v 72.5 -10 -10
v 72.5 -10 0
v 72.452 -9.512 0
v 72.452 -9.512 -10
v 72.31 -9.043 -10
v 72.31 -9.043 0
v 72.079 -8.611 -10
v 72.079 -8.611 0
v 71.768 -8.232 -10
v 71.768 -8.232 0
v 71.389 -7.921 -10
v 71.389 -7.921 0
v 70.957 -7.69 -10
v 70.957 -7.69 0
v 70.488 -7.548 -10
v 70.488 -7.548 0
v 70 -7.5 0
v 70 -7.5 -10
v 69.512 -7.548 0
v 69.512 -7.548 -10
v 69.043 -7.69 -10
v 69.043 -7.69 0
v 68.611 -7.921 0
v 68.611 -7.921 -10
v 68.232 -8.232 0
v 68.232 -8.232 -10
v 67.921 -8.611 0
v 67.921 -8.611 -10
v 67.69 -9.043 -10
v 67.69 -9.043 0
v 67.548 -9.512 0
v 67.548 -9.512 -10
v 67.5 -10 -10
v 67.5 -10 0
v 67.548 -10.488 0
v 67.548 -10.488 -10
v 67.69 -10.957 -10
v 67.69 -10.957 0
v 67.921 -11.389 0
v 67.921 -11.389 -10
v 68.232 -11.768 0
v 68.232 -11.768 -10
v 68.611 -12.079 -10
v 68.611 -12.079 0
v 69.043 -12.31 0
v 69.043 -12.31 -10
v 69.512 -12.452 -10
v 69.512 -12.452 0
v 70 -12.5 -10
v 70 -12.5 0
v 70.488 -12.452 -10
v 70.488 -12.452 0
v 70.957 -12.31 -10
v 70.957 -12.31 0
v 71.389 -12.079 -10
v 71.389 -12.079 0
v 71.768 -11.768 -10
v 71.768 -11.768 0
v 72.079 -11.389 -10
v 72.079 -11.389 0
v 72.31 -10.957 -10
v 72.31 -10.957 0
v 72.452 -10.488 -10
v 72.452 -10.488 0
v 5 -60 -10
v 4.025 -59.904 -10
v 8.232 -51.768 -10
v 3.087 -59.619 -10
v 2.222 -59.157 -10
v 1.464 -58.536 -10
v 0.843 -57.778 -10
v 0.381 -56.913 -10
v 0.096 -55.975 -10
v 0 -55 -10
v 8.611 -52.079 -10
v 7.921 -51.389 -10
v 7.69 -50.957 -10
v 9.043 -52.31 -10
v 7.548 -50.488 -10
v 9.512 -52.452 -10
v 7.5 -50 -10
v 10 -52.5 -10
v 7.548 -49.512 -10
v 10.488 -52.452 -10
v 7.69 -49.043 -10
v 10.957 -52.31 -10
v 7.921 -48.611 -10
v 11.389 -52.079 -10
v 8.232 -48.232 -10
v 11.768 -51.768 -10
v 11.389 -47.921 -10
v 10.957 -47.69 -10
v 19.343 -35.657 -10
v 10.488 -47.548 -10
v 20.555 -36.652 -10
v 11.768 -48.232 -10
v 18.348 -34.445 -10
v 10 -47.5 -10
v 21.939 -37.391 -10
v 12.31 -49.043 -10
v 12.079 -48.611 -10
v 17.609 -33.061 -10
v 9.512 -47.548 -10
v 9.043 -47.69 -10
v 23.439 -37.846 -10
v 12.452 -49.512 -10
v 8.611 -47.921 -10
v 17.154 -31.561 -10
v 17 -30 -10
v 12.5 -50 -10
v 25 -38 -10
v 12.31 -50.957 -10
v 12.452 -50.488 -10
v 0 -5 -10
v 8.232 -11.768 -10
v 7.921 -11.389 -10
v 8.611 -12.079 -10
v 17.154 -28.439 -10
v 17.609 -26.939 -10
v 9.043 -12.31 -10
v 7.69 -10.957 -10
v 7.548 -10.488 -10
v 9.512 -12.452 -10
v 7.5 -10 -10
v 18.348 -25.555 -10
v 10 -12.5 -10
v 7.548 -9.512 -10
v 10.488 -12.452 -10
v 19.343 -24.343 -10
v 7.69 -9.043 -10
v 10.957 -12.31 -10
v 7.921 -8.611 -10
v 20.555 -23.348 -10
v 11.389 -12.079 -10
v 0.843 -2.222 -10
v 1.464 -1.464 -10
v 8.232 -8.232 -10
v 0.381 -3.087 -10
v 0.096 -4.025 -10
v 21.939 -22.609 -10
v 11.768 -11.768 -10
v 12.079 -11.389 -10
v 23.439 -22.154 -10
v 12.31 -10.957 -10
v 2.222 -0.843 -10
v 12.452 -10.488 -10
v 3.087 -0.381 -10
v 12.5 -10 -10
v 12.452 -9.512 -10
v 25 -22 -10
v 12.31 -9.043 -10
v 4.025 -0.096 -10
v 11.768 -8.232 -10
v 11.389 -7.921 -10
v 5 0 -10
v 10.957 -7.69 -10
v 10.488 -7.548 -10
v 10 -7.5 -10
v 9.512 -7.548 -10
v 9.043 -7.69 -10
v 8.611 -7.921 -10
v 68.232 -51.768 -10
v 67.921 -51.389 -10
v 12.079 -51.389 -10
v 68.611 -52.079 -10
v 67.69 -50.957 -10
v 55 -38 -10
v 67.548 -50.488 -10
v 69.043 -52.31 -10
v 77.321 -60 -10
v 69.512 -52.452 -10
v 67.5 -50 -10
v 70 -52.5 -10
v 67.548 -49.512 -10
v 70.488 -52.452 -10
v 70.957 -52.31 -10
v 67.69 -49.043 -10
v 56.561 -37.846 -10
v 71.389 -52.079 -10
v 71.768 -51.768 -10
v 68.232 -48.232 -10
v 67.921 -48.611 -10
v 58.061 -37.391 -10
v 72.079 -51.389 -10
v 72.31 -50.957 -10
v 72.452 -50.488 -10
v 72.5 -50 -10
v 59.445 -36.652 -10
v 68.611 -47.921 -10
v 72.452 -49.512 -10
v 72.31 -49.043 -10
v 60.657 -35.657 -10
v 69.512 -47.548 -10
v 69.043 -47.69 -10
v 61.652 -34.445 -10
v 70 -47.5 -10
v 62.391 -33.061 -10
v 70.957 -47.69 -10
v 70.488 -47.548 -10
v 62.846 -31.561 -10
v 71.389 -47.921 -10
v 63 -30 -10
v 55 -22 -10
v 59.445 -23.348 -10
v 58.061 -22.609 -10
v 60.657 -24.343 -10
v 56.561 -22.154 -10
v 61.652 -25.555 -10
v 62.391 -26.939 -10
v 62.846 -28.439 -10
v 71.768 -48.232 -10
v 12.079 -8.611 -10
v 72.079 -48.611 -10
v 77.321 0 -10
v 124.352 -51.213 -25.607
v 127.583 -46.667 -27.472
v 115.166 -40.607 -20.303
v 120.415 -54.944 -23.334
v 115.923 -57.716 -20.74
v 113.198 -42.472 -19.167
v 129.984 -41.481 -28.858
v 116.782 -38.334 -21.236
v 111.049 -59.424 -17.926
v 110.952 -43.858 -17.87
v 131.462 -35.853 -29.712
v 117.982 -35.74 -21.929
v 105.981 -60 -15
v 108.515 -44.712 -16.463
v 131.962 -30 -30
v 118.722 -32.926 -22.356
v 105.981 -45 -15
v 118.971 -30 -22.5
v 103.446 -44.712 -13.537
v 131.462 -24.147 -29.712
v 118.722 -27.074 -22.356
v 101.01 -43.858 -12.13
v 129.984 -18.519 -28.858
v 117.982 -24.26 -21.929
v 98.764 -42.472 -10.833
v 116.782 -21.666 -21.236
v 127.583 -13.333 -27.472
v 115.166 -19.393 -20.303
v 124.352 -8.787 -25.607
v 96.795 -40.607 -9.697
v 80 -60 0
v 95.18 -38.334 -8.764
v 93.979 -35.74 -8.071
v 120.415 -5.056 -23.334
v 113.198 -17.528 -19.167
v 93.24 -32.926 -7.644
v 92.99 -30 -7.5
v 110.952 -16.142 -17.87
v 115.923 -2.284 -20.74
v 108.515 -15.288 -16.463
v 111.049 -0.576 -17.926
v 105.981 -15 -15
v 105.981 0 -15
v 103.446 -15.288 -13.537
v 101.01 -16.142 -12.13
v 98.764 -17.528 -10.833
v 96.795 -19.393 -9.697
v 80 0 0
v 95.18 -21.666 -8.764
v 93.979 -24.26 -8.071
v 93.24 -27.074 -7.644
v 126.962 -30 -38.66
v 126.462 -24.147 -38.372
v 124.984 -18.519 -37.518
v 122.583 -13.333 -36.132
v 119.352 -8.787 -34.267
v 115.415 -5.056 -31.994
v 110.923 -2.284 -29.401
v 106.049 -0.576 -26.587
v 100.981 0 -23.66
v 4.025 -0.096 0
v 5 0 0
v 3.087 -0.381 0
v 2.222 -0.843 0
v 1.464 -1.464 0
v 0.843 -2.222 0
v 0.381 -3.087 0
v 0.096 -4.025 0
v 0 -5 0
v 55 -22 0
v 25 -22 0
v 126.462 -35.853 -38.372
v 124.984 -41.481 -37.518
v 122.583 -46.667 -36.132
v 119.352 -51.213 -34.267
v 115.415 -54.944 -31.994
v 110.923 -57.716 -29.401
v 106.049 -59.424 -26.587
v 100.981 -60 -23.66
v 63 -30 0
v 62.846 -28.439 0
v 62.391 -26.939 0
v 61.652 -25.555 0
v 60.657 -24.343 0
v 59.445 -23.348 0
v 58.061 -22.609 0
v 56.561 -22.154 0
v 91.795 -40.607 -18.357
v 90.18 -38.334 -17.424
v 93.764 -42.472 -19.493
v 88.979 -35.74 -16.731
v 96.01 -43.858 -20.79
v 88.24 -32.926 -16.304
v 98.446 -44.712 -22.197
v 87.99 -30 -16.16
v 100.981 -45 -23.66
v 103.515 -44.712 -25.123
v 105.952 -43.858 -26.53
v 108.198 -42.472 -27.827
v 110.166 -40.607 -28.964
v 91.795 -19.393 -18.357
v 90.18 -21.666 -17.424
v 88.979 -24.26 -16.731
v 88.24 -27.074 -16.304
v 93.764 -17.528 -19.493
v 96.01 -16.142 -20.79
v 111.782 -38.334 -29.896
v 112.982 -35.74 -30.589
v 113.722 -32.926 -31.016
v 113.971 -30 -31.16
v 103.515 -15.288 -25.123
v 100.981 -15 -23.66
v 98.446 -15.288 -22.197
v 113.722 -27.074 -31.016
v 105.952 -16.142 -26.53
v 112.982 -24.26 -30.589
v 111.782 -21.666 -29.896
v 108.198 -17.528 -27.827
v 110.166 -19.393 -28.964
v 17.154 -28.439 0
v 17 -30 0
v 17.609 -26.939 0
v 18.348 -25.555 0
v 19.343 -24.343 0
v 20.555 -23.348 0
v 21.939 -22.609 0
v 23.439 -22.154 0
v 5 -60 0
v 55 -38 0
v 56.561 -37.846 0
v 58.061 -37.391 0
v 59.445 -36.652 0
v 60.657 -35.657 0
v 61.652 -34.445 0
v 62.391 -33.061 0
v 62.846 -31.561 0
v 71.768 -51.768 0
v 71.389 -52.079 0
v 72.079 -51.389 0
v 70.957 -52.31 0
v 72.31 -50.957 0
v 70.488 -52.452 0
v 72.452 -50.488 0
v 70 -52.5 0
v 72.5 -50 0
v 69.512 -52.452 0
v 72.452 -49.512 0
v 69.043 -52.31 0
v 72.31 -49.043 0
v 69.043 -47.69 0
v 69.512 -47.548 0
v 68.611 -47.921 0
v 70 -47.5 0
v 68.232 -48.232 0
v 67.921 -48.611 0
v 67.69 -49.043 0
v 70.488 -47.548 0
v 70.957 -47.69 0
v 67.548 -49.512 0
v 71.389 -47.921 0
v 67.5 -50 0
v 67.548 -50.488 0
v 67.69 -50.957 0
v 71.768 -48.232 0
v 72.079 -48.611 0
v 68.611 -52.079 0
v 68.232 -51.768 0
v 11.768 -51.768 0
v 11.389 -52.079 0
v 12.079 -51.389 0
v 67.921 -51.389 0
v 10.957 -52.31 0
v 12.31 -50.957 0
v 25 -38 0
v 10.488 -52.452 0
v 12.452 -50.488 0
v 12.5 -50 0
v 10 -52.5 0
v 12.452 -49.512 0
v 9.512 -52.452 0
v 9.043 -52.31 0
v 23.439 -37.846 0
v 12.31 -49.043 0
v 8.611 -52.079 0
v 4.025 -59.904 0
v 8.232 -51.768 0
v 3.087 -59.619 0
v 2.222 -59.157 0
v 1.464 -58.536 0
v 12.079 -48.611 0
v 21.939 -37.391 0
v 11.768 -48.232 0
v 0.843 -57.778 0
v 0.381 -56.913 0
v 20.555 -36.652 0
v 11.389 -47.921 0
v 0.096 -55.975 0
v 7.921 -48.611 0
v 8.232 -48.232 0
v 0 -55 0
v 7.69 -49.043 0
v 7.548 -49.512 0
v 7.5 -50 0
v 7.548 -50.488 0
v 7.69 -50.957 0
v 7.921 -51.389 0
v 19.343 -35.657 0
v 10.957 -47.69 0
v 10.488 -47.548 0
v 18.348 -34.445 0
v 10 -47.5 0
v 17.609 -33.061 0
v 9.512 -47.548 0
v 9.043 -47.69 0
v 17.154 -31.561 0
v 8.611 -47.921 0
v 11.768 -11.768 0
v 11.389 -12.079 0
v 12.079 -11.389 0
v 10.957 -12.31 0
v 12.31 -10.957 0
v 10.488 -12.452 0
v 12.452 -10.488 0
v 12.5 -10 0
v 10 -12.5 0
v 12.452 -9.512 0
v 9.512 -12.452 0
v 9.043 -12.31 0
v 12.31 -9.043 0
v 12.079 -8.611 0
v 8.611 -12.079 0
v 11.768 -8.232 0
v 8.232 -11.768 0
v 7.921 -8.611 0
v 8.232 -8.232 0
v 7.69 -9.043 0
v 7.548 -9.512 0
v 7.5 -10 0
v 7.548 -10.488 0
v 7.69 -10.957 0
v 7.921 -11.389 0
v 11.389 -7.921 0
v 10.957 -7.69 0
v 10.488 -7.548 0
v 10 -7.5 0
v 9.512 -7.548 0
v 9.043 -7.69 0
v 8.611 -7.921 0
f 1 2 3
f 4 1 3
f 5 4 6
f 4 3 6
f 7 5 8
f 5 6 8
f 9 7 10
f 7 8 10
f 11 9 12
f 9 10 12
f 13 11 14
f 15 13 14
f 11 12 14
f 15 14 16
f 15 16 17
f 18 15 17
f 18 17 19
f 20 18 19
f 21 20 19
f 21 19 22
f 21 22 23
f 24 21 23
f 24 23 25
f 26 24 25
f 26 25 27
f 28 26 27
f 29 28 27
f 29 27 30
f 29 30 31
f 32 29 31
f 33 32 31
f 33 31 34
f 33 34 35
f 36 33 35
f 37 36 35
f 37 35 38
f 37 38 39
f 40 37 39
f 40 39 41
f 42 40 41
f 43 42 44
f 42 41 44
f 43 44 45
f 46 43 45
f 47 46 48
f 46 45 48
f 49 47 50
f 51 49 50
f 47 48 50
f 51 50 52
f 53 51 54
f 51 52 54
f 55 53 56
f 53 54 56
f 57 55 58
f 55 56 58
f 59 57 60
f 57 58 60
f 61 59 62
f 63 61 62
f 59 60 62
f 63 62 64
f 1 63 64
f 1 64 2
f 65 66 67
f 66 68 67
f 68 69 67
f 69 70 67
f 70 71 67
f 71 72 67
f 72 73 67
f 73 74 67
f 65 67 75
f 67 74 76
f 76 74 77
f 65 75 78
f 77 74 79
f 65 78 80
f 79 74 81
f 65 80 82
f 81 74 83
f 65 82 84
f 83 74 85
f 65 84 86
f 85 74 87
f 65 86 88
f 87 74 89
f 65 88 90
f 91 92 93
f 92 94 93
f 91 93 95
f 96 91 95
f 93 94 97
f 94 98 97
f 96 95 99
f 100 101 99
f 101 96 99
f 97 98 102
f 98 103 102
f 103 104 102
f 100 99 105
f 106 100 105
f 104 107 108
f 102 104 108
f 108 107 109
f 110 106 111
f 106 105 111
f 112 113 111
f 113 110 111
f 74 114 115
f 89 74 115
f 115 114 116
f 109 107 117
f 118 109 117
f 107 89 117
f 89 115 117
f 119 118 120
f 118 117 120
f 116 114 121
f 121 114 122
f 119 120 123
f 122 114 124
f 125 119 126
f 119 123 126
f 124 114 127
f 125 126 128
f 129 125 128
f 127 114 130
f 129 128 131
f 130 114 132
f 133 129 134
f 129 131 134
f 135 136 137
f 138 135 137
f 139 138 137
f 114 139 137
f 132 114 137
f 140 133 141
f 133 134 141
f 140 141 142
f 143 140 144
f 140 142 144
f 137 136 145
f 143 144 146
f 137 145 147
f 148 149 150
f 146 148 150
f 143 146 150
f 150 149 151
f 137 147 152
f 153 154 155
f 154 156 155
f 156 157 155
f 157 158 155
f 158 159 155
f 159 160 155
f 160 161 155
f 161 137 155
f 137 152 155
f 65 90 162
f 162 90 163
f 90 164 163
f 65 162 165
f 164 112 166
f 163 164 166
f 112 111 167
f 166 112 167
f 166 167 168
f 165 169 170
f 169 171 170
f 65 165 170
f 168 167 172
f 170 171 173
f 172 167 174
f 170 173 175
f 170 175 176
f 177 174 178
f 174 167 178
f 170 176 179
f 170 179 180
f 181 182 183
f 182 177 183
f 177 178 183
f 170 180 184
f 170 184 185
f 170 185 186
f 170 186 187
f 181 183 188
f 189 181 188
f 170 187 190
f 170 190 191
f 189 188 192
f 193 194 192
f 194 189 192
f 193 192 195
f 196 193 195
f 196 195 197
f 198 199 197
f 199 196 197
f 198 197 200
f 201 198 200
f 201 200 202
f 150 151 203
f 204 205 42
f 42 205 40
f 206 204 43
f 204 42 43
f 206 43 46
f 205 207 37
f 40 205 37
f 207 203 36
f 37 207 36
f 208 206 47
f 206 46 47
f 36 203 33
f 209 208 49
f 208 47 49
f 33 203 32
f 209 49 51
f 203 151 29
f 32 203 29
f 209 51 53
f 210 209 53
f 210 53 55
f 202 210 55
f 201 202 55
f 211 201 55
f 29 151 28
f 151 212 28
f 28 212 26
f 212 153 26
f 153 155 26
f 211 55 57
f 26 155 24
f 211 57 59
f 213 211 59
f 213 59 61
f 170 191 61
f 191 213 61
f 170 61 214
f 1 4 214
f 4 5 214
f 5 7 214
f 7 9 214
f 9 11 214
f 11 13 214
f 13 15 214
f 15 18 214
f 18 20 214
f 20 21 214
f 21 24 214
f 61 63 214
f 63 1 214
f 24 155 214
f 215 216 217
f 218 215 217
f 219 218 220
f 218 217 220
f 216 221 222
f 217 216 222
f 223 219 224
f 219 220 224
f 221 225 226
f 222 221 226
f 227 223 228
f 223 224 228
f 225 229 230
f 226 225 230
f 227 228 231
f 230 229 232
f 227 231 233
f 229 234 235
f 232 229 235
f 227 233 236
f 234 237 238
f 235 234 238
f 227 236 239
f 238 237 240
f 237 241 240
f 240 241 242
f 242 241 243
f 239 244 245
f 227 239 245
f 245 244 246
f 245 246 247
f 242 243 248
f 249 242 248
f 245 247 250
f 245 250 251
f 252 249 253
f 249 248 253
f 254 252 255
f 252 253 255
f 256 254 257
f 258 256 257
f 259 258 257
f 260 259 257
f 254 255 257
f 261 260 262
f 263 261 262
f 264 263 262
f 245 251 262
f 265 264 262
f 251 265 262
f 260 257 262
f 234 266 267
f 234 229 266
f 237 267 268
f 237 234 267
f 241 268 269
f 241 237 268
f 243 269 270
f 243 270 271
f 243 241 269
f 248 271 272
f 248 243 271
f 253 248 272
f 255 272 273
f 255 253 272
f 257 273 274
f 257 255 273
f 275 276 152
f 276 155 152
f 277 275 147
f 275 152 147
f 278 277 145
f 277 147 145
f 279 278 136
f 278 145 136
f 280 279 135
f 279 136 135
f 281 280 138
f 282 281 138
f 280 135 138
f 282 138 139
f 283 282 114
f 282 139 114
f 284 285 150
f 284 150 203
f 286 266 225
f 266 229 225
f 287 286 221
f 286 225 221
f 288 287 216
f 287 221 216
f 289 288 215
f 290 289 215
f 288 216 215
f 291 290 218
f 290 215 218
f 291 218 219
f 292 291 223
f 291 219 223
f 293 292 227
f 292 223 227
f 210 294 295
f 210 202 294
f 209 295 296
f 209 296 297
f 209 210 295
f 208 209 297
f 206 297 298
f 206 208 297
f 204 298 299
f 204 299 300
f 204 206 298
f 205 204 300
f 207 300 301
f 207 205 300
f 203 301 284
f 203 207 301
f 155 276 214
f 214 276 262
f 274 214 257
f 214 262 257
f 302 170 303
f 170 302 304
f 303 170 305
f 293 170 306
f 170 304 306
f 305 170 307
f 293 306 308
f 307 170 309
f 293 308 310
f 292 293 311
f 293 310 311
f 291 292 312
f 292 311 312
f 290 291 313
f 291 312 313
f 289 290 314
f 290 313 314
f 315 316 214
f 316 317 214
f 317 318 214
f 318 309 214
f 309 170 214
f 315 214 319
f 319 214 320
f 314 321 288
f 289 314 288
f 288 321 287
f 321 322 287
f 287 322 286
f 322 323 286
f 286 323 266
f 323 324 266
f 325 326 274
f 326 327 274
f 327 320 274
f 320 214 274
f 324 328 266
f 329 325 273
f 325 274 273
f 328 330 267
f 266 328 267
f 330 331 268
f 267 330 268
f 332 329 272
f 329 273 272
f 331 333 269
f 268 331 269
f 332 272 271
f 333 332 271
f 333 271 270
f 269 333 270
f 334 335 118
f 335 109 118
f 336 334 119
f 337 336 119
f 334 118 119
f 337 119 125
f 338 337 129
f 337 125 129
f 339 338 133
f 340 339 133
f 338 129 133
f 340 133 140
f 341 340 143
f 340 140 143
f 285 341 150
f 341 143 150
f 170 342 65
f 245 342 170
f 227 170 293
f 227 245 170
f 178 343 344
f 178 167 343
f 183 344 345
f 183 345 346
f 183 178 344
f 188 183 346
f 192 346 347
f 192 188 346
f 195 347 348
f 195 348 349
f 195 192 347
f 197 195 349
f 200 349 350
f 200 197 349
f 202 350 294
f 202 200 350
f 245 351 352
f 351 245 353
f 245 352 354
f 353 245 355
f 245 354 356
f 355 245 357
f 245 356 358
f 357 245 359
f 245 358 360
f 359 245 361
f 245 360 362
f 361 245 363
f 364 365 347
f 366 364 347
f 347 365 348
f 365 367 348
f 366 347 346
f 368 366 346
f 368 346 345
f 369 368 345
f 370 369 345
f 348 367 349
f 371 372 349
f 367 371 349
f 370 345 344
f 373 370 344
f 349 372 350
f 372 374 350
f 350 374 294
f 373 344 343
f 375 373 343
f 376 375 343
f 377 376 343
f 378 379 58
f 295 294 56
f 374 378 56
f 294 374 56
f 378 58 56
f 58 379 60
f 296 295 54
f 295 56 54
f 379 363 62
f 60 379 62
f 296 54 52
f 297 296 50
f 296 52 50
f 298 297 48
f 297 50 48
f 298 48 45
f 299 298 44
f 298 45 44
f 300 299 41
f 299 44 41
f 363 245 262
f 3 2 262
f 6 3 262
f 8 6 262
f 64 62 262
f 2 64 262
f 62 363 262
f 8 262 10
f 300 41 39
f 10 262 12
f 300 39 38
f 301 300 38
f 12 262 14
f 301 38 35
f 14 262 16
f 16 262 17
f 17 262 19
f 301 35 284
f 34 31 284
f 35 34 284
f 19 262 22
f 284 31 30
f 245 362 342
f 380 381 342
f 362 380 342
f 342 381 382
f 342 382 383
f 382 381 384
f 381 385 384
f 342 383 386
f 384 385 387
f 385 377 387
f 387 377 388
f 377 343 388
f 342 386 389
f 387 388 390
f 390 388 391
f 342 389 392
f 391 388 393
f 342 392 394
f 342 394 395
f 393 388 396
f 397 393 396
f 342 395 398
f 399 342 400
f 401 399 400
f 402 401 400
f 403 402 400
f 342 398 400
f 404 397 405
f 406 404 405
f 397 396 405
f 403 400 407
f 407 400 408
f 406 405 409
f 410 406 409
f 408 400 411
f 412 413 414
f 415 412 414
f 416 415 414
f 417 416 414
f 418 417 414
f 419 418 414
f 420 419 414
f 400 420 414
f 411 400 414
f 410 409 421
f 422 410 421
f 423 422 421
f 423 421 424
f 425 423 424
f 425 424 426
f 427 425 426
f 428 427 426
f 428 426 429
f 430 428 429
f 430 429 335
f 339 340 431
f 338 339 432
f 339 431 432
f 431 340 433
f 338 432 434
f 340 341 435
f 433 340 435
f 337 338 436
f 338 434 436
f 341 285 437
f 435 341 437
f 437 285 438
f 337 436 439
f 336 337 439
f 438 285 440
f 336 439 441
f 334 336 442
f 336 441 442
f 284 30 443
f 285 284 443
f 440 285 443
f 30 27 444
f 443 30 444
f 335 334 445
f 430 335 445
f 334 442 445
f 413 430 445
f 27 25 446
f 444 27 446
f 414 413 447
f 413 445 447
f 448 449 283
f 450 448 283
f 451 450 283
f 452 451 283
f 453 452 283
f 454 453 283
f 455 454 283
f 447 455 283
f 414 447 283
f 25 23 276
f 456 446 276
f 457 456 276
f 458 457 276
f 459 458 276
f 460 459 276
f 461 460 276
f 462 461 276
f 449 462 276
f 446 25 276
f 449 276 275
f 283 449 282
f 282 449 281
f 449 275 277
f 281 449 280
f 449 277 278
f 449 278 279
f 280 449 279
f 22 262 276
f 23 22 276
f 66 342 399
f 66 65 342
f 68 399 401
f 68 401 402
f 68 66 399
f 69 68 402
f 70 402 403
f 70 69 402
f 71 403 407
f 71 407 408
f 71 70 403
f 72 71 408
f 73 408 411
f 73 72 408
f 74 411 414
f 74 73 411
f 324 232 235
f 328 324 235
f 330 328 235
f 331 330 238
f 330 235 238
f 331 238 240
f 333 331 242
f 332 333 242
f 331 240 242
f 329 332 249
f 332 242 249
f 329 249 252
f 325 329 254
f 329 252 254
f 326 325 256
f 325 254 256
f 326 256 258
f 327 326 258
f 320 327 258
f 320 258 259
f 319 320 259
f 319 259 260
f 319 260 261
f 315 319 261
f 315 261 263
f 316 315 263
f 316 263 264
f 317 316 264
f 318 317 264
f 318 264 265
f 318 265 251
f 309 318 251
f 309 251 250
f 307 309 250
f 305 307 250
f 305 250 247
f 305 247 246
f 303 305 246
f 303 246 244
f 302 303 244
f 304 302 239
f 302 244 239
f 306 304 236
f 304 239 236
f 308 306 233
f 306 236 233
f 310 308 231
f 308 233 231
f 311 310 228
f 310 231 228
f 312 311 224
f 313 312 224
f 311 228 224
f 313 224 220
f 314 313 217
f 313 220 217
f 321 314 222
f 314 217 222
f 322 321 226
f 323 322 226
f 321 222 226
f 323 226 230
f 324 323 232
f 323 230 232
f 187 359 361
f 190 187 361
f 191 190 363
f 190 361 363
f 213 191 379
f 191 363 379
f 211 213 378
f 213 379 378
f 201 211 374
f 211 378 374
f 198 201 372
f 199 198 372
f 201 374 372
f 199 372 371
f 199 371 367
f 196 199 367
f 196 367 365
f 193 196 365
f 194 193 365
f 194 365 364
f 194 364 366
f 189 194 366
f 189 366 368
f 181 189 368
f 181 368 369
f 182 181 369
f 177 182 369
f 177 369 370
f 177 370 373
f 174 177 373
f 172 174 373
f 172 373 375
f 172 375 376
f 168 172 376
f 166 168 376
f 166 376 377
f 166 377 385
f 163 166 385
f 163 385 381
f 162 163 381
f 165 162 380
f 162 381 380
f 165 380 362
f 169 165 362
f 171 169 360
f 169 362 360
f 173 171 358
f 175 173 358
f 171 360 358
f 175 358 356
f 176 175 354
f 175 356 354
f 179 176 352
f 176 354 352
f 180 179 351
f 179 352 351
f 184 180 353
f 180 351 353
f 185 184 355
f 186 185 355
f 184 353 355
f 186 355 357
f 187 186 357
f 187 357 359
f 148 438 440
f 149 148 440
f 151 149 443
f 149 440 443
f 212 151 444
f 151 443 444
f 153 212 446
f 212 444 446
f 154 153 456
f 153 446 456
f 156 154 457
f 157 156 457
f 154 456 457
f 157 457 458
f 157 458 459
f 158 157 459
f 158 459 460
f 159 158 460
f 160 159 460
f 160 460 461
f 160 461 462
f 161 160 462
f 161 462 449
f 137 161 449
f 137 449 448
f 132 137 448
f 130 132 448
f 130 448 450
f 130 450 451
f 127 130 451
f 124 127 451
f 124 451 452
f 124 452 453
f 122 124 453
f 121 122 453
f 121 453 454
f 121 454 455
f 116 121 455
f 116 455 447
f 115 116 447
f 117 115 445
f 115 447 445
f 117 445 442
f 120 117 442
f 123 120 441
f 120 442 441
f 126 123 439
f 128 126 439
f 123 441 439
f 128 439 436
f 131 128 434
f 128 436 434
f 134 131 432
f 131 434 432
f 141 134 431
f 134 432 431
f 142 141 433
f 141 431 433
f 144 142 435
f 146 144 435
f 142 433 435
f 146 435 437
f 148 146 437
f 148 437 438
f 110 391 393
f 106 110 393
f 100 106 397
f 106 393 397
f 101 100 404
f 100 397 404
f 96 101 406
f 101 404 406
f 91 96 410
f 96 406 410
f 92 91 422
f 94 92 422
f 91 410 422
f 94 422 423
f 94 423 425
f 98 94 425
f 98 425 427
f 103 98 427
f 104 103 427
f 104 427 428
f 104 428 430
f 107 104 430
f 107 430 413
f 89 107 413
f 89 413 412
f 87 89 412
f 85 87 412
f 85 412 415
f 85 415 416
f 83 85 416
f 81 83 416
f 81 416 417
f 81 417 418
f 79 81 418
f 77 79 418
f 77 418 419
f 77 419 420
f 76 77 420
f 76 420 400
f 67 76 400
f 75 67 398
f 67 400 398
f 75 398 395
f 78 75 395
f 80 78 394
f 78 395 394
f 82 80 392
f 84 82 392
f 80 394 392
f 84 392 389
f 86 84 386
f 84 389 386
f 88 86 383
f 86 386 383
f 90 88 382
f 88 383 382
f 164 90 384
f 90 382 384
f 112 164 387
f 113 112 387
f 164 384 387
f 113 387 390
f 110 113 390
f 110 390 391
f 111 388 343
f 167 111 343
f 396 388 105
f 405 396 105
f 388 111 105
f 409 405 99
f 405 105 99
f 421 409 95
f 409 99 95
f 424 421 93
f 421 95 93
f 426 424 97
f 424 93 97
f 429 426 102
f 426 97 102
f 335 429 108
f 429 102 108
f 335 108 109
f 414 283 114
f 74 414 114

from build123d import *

# Parameters (mm, degrees)
F1_DEPTH = 60
F2_R     = 29.99999
F3_R     = 15
F4_DEPTH = 25
F5_R     = 5
F6_W     = 46
F6_H     = 16
F7_DEPTH = 25
F6_R     = 2.5
F8_DEPTH = 25
F9_R     = 7.99999


# Not quite as in the source:
# - a fillet or chamfer is up to 0.001 mm smaller than in the source, because OpenCascade refuses the exact size


with BuildPart() as f1:
    # F0 (on Front) → F1 (new body)
    with BuildSketch(Plane.XZ):
        Polygon((80, 0), (0, 0), (0, -10), (77.3205080757, -10), align=None)
        Polygon((131.9615242271, -30), (80, 0), (77.3205080757, -10), (126.9615242271, -38.6602540378), align=None)
    extrude(amount=F1_DEPTH)

    # F2 (radius 30 in the source; OpenCascade refuses exactly that, so slightly less here)
    f2_edges = [f1.edges().sort_by_distance(p)[0] for p in [
        (129.461524, 0, -34.330127),
        (129.461524, -60, -34.330127),
    ]]
    fillet(f2_edges, radius=F2_R)

    # F3 (on face) → F4 (cut)
    with BuildSketch(Plane(origin=(20, 0, 34.6410161514), x_dir=(0.8660254038, 0, -0.5), z_dir=(0.5, 0, 0.8660254038))):
        with Locations((99.2820323028, -30)):
            Circle(F3_R)
    extrude(amount=-F4_DEPTH, mode=Mode.SUBTRACT)

    # F5
    f5_edges = [f1.edges().sort_by_distance(p)[0] for p in [
        (0, 0, -5),
        (0, -60, -5),
    ]]
    fillet(f5_edges, radius=F5_R)

    # F6 (on face) → F7 (cut)
    with BuildSketch(Plane.XY):
        with Locations((40, -30)):
            Rectangle(F6_W, F6_H)
    extrude(amount=-F7_DEPTH, mode=Mode.SUBTRACT)

    # F6 (on face) → F8 (cut)
    with BuildSketch(Plane.XY):
        with Locations((10, -50)):
            Circle(F6_R)
        with Locations((70, -50)):
            Circle(F6_R)
        with Locations((70, -10)):
            Circle(F6_R)
        with Locations((10, -10)):
            Circle(F6_R)
        with Locations((40, -30)):
            Rectangle(F6_W, F6_H)
    extrude(amount=-F8_DEPTH, mode=Mode.SUBTRACT)

    # F9 (radius 8 in the source; OpenCascade refuses exactly that, so slightly less here)
    f9_edges = [f1.edges().sort_by_distance(p)[0] for p in [
        (63, -22, -5),
        (63, -38, -5),
        (17, -22, -5),
        (17, -38, -5),
    ]]
    fillet(f9_edges, radius=F9_R)


solid = f1.part
